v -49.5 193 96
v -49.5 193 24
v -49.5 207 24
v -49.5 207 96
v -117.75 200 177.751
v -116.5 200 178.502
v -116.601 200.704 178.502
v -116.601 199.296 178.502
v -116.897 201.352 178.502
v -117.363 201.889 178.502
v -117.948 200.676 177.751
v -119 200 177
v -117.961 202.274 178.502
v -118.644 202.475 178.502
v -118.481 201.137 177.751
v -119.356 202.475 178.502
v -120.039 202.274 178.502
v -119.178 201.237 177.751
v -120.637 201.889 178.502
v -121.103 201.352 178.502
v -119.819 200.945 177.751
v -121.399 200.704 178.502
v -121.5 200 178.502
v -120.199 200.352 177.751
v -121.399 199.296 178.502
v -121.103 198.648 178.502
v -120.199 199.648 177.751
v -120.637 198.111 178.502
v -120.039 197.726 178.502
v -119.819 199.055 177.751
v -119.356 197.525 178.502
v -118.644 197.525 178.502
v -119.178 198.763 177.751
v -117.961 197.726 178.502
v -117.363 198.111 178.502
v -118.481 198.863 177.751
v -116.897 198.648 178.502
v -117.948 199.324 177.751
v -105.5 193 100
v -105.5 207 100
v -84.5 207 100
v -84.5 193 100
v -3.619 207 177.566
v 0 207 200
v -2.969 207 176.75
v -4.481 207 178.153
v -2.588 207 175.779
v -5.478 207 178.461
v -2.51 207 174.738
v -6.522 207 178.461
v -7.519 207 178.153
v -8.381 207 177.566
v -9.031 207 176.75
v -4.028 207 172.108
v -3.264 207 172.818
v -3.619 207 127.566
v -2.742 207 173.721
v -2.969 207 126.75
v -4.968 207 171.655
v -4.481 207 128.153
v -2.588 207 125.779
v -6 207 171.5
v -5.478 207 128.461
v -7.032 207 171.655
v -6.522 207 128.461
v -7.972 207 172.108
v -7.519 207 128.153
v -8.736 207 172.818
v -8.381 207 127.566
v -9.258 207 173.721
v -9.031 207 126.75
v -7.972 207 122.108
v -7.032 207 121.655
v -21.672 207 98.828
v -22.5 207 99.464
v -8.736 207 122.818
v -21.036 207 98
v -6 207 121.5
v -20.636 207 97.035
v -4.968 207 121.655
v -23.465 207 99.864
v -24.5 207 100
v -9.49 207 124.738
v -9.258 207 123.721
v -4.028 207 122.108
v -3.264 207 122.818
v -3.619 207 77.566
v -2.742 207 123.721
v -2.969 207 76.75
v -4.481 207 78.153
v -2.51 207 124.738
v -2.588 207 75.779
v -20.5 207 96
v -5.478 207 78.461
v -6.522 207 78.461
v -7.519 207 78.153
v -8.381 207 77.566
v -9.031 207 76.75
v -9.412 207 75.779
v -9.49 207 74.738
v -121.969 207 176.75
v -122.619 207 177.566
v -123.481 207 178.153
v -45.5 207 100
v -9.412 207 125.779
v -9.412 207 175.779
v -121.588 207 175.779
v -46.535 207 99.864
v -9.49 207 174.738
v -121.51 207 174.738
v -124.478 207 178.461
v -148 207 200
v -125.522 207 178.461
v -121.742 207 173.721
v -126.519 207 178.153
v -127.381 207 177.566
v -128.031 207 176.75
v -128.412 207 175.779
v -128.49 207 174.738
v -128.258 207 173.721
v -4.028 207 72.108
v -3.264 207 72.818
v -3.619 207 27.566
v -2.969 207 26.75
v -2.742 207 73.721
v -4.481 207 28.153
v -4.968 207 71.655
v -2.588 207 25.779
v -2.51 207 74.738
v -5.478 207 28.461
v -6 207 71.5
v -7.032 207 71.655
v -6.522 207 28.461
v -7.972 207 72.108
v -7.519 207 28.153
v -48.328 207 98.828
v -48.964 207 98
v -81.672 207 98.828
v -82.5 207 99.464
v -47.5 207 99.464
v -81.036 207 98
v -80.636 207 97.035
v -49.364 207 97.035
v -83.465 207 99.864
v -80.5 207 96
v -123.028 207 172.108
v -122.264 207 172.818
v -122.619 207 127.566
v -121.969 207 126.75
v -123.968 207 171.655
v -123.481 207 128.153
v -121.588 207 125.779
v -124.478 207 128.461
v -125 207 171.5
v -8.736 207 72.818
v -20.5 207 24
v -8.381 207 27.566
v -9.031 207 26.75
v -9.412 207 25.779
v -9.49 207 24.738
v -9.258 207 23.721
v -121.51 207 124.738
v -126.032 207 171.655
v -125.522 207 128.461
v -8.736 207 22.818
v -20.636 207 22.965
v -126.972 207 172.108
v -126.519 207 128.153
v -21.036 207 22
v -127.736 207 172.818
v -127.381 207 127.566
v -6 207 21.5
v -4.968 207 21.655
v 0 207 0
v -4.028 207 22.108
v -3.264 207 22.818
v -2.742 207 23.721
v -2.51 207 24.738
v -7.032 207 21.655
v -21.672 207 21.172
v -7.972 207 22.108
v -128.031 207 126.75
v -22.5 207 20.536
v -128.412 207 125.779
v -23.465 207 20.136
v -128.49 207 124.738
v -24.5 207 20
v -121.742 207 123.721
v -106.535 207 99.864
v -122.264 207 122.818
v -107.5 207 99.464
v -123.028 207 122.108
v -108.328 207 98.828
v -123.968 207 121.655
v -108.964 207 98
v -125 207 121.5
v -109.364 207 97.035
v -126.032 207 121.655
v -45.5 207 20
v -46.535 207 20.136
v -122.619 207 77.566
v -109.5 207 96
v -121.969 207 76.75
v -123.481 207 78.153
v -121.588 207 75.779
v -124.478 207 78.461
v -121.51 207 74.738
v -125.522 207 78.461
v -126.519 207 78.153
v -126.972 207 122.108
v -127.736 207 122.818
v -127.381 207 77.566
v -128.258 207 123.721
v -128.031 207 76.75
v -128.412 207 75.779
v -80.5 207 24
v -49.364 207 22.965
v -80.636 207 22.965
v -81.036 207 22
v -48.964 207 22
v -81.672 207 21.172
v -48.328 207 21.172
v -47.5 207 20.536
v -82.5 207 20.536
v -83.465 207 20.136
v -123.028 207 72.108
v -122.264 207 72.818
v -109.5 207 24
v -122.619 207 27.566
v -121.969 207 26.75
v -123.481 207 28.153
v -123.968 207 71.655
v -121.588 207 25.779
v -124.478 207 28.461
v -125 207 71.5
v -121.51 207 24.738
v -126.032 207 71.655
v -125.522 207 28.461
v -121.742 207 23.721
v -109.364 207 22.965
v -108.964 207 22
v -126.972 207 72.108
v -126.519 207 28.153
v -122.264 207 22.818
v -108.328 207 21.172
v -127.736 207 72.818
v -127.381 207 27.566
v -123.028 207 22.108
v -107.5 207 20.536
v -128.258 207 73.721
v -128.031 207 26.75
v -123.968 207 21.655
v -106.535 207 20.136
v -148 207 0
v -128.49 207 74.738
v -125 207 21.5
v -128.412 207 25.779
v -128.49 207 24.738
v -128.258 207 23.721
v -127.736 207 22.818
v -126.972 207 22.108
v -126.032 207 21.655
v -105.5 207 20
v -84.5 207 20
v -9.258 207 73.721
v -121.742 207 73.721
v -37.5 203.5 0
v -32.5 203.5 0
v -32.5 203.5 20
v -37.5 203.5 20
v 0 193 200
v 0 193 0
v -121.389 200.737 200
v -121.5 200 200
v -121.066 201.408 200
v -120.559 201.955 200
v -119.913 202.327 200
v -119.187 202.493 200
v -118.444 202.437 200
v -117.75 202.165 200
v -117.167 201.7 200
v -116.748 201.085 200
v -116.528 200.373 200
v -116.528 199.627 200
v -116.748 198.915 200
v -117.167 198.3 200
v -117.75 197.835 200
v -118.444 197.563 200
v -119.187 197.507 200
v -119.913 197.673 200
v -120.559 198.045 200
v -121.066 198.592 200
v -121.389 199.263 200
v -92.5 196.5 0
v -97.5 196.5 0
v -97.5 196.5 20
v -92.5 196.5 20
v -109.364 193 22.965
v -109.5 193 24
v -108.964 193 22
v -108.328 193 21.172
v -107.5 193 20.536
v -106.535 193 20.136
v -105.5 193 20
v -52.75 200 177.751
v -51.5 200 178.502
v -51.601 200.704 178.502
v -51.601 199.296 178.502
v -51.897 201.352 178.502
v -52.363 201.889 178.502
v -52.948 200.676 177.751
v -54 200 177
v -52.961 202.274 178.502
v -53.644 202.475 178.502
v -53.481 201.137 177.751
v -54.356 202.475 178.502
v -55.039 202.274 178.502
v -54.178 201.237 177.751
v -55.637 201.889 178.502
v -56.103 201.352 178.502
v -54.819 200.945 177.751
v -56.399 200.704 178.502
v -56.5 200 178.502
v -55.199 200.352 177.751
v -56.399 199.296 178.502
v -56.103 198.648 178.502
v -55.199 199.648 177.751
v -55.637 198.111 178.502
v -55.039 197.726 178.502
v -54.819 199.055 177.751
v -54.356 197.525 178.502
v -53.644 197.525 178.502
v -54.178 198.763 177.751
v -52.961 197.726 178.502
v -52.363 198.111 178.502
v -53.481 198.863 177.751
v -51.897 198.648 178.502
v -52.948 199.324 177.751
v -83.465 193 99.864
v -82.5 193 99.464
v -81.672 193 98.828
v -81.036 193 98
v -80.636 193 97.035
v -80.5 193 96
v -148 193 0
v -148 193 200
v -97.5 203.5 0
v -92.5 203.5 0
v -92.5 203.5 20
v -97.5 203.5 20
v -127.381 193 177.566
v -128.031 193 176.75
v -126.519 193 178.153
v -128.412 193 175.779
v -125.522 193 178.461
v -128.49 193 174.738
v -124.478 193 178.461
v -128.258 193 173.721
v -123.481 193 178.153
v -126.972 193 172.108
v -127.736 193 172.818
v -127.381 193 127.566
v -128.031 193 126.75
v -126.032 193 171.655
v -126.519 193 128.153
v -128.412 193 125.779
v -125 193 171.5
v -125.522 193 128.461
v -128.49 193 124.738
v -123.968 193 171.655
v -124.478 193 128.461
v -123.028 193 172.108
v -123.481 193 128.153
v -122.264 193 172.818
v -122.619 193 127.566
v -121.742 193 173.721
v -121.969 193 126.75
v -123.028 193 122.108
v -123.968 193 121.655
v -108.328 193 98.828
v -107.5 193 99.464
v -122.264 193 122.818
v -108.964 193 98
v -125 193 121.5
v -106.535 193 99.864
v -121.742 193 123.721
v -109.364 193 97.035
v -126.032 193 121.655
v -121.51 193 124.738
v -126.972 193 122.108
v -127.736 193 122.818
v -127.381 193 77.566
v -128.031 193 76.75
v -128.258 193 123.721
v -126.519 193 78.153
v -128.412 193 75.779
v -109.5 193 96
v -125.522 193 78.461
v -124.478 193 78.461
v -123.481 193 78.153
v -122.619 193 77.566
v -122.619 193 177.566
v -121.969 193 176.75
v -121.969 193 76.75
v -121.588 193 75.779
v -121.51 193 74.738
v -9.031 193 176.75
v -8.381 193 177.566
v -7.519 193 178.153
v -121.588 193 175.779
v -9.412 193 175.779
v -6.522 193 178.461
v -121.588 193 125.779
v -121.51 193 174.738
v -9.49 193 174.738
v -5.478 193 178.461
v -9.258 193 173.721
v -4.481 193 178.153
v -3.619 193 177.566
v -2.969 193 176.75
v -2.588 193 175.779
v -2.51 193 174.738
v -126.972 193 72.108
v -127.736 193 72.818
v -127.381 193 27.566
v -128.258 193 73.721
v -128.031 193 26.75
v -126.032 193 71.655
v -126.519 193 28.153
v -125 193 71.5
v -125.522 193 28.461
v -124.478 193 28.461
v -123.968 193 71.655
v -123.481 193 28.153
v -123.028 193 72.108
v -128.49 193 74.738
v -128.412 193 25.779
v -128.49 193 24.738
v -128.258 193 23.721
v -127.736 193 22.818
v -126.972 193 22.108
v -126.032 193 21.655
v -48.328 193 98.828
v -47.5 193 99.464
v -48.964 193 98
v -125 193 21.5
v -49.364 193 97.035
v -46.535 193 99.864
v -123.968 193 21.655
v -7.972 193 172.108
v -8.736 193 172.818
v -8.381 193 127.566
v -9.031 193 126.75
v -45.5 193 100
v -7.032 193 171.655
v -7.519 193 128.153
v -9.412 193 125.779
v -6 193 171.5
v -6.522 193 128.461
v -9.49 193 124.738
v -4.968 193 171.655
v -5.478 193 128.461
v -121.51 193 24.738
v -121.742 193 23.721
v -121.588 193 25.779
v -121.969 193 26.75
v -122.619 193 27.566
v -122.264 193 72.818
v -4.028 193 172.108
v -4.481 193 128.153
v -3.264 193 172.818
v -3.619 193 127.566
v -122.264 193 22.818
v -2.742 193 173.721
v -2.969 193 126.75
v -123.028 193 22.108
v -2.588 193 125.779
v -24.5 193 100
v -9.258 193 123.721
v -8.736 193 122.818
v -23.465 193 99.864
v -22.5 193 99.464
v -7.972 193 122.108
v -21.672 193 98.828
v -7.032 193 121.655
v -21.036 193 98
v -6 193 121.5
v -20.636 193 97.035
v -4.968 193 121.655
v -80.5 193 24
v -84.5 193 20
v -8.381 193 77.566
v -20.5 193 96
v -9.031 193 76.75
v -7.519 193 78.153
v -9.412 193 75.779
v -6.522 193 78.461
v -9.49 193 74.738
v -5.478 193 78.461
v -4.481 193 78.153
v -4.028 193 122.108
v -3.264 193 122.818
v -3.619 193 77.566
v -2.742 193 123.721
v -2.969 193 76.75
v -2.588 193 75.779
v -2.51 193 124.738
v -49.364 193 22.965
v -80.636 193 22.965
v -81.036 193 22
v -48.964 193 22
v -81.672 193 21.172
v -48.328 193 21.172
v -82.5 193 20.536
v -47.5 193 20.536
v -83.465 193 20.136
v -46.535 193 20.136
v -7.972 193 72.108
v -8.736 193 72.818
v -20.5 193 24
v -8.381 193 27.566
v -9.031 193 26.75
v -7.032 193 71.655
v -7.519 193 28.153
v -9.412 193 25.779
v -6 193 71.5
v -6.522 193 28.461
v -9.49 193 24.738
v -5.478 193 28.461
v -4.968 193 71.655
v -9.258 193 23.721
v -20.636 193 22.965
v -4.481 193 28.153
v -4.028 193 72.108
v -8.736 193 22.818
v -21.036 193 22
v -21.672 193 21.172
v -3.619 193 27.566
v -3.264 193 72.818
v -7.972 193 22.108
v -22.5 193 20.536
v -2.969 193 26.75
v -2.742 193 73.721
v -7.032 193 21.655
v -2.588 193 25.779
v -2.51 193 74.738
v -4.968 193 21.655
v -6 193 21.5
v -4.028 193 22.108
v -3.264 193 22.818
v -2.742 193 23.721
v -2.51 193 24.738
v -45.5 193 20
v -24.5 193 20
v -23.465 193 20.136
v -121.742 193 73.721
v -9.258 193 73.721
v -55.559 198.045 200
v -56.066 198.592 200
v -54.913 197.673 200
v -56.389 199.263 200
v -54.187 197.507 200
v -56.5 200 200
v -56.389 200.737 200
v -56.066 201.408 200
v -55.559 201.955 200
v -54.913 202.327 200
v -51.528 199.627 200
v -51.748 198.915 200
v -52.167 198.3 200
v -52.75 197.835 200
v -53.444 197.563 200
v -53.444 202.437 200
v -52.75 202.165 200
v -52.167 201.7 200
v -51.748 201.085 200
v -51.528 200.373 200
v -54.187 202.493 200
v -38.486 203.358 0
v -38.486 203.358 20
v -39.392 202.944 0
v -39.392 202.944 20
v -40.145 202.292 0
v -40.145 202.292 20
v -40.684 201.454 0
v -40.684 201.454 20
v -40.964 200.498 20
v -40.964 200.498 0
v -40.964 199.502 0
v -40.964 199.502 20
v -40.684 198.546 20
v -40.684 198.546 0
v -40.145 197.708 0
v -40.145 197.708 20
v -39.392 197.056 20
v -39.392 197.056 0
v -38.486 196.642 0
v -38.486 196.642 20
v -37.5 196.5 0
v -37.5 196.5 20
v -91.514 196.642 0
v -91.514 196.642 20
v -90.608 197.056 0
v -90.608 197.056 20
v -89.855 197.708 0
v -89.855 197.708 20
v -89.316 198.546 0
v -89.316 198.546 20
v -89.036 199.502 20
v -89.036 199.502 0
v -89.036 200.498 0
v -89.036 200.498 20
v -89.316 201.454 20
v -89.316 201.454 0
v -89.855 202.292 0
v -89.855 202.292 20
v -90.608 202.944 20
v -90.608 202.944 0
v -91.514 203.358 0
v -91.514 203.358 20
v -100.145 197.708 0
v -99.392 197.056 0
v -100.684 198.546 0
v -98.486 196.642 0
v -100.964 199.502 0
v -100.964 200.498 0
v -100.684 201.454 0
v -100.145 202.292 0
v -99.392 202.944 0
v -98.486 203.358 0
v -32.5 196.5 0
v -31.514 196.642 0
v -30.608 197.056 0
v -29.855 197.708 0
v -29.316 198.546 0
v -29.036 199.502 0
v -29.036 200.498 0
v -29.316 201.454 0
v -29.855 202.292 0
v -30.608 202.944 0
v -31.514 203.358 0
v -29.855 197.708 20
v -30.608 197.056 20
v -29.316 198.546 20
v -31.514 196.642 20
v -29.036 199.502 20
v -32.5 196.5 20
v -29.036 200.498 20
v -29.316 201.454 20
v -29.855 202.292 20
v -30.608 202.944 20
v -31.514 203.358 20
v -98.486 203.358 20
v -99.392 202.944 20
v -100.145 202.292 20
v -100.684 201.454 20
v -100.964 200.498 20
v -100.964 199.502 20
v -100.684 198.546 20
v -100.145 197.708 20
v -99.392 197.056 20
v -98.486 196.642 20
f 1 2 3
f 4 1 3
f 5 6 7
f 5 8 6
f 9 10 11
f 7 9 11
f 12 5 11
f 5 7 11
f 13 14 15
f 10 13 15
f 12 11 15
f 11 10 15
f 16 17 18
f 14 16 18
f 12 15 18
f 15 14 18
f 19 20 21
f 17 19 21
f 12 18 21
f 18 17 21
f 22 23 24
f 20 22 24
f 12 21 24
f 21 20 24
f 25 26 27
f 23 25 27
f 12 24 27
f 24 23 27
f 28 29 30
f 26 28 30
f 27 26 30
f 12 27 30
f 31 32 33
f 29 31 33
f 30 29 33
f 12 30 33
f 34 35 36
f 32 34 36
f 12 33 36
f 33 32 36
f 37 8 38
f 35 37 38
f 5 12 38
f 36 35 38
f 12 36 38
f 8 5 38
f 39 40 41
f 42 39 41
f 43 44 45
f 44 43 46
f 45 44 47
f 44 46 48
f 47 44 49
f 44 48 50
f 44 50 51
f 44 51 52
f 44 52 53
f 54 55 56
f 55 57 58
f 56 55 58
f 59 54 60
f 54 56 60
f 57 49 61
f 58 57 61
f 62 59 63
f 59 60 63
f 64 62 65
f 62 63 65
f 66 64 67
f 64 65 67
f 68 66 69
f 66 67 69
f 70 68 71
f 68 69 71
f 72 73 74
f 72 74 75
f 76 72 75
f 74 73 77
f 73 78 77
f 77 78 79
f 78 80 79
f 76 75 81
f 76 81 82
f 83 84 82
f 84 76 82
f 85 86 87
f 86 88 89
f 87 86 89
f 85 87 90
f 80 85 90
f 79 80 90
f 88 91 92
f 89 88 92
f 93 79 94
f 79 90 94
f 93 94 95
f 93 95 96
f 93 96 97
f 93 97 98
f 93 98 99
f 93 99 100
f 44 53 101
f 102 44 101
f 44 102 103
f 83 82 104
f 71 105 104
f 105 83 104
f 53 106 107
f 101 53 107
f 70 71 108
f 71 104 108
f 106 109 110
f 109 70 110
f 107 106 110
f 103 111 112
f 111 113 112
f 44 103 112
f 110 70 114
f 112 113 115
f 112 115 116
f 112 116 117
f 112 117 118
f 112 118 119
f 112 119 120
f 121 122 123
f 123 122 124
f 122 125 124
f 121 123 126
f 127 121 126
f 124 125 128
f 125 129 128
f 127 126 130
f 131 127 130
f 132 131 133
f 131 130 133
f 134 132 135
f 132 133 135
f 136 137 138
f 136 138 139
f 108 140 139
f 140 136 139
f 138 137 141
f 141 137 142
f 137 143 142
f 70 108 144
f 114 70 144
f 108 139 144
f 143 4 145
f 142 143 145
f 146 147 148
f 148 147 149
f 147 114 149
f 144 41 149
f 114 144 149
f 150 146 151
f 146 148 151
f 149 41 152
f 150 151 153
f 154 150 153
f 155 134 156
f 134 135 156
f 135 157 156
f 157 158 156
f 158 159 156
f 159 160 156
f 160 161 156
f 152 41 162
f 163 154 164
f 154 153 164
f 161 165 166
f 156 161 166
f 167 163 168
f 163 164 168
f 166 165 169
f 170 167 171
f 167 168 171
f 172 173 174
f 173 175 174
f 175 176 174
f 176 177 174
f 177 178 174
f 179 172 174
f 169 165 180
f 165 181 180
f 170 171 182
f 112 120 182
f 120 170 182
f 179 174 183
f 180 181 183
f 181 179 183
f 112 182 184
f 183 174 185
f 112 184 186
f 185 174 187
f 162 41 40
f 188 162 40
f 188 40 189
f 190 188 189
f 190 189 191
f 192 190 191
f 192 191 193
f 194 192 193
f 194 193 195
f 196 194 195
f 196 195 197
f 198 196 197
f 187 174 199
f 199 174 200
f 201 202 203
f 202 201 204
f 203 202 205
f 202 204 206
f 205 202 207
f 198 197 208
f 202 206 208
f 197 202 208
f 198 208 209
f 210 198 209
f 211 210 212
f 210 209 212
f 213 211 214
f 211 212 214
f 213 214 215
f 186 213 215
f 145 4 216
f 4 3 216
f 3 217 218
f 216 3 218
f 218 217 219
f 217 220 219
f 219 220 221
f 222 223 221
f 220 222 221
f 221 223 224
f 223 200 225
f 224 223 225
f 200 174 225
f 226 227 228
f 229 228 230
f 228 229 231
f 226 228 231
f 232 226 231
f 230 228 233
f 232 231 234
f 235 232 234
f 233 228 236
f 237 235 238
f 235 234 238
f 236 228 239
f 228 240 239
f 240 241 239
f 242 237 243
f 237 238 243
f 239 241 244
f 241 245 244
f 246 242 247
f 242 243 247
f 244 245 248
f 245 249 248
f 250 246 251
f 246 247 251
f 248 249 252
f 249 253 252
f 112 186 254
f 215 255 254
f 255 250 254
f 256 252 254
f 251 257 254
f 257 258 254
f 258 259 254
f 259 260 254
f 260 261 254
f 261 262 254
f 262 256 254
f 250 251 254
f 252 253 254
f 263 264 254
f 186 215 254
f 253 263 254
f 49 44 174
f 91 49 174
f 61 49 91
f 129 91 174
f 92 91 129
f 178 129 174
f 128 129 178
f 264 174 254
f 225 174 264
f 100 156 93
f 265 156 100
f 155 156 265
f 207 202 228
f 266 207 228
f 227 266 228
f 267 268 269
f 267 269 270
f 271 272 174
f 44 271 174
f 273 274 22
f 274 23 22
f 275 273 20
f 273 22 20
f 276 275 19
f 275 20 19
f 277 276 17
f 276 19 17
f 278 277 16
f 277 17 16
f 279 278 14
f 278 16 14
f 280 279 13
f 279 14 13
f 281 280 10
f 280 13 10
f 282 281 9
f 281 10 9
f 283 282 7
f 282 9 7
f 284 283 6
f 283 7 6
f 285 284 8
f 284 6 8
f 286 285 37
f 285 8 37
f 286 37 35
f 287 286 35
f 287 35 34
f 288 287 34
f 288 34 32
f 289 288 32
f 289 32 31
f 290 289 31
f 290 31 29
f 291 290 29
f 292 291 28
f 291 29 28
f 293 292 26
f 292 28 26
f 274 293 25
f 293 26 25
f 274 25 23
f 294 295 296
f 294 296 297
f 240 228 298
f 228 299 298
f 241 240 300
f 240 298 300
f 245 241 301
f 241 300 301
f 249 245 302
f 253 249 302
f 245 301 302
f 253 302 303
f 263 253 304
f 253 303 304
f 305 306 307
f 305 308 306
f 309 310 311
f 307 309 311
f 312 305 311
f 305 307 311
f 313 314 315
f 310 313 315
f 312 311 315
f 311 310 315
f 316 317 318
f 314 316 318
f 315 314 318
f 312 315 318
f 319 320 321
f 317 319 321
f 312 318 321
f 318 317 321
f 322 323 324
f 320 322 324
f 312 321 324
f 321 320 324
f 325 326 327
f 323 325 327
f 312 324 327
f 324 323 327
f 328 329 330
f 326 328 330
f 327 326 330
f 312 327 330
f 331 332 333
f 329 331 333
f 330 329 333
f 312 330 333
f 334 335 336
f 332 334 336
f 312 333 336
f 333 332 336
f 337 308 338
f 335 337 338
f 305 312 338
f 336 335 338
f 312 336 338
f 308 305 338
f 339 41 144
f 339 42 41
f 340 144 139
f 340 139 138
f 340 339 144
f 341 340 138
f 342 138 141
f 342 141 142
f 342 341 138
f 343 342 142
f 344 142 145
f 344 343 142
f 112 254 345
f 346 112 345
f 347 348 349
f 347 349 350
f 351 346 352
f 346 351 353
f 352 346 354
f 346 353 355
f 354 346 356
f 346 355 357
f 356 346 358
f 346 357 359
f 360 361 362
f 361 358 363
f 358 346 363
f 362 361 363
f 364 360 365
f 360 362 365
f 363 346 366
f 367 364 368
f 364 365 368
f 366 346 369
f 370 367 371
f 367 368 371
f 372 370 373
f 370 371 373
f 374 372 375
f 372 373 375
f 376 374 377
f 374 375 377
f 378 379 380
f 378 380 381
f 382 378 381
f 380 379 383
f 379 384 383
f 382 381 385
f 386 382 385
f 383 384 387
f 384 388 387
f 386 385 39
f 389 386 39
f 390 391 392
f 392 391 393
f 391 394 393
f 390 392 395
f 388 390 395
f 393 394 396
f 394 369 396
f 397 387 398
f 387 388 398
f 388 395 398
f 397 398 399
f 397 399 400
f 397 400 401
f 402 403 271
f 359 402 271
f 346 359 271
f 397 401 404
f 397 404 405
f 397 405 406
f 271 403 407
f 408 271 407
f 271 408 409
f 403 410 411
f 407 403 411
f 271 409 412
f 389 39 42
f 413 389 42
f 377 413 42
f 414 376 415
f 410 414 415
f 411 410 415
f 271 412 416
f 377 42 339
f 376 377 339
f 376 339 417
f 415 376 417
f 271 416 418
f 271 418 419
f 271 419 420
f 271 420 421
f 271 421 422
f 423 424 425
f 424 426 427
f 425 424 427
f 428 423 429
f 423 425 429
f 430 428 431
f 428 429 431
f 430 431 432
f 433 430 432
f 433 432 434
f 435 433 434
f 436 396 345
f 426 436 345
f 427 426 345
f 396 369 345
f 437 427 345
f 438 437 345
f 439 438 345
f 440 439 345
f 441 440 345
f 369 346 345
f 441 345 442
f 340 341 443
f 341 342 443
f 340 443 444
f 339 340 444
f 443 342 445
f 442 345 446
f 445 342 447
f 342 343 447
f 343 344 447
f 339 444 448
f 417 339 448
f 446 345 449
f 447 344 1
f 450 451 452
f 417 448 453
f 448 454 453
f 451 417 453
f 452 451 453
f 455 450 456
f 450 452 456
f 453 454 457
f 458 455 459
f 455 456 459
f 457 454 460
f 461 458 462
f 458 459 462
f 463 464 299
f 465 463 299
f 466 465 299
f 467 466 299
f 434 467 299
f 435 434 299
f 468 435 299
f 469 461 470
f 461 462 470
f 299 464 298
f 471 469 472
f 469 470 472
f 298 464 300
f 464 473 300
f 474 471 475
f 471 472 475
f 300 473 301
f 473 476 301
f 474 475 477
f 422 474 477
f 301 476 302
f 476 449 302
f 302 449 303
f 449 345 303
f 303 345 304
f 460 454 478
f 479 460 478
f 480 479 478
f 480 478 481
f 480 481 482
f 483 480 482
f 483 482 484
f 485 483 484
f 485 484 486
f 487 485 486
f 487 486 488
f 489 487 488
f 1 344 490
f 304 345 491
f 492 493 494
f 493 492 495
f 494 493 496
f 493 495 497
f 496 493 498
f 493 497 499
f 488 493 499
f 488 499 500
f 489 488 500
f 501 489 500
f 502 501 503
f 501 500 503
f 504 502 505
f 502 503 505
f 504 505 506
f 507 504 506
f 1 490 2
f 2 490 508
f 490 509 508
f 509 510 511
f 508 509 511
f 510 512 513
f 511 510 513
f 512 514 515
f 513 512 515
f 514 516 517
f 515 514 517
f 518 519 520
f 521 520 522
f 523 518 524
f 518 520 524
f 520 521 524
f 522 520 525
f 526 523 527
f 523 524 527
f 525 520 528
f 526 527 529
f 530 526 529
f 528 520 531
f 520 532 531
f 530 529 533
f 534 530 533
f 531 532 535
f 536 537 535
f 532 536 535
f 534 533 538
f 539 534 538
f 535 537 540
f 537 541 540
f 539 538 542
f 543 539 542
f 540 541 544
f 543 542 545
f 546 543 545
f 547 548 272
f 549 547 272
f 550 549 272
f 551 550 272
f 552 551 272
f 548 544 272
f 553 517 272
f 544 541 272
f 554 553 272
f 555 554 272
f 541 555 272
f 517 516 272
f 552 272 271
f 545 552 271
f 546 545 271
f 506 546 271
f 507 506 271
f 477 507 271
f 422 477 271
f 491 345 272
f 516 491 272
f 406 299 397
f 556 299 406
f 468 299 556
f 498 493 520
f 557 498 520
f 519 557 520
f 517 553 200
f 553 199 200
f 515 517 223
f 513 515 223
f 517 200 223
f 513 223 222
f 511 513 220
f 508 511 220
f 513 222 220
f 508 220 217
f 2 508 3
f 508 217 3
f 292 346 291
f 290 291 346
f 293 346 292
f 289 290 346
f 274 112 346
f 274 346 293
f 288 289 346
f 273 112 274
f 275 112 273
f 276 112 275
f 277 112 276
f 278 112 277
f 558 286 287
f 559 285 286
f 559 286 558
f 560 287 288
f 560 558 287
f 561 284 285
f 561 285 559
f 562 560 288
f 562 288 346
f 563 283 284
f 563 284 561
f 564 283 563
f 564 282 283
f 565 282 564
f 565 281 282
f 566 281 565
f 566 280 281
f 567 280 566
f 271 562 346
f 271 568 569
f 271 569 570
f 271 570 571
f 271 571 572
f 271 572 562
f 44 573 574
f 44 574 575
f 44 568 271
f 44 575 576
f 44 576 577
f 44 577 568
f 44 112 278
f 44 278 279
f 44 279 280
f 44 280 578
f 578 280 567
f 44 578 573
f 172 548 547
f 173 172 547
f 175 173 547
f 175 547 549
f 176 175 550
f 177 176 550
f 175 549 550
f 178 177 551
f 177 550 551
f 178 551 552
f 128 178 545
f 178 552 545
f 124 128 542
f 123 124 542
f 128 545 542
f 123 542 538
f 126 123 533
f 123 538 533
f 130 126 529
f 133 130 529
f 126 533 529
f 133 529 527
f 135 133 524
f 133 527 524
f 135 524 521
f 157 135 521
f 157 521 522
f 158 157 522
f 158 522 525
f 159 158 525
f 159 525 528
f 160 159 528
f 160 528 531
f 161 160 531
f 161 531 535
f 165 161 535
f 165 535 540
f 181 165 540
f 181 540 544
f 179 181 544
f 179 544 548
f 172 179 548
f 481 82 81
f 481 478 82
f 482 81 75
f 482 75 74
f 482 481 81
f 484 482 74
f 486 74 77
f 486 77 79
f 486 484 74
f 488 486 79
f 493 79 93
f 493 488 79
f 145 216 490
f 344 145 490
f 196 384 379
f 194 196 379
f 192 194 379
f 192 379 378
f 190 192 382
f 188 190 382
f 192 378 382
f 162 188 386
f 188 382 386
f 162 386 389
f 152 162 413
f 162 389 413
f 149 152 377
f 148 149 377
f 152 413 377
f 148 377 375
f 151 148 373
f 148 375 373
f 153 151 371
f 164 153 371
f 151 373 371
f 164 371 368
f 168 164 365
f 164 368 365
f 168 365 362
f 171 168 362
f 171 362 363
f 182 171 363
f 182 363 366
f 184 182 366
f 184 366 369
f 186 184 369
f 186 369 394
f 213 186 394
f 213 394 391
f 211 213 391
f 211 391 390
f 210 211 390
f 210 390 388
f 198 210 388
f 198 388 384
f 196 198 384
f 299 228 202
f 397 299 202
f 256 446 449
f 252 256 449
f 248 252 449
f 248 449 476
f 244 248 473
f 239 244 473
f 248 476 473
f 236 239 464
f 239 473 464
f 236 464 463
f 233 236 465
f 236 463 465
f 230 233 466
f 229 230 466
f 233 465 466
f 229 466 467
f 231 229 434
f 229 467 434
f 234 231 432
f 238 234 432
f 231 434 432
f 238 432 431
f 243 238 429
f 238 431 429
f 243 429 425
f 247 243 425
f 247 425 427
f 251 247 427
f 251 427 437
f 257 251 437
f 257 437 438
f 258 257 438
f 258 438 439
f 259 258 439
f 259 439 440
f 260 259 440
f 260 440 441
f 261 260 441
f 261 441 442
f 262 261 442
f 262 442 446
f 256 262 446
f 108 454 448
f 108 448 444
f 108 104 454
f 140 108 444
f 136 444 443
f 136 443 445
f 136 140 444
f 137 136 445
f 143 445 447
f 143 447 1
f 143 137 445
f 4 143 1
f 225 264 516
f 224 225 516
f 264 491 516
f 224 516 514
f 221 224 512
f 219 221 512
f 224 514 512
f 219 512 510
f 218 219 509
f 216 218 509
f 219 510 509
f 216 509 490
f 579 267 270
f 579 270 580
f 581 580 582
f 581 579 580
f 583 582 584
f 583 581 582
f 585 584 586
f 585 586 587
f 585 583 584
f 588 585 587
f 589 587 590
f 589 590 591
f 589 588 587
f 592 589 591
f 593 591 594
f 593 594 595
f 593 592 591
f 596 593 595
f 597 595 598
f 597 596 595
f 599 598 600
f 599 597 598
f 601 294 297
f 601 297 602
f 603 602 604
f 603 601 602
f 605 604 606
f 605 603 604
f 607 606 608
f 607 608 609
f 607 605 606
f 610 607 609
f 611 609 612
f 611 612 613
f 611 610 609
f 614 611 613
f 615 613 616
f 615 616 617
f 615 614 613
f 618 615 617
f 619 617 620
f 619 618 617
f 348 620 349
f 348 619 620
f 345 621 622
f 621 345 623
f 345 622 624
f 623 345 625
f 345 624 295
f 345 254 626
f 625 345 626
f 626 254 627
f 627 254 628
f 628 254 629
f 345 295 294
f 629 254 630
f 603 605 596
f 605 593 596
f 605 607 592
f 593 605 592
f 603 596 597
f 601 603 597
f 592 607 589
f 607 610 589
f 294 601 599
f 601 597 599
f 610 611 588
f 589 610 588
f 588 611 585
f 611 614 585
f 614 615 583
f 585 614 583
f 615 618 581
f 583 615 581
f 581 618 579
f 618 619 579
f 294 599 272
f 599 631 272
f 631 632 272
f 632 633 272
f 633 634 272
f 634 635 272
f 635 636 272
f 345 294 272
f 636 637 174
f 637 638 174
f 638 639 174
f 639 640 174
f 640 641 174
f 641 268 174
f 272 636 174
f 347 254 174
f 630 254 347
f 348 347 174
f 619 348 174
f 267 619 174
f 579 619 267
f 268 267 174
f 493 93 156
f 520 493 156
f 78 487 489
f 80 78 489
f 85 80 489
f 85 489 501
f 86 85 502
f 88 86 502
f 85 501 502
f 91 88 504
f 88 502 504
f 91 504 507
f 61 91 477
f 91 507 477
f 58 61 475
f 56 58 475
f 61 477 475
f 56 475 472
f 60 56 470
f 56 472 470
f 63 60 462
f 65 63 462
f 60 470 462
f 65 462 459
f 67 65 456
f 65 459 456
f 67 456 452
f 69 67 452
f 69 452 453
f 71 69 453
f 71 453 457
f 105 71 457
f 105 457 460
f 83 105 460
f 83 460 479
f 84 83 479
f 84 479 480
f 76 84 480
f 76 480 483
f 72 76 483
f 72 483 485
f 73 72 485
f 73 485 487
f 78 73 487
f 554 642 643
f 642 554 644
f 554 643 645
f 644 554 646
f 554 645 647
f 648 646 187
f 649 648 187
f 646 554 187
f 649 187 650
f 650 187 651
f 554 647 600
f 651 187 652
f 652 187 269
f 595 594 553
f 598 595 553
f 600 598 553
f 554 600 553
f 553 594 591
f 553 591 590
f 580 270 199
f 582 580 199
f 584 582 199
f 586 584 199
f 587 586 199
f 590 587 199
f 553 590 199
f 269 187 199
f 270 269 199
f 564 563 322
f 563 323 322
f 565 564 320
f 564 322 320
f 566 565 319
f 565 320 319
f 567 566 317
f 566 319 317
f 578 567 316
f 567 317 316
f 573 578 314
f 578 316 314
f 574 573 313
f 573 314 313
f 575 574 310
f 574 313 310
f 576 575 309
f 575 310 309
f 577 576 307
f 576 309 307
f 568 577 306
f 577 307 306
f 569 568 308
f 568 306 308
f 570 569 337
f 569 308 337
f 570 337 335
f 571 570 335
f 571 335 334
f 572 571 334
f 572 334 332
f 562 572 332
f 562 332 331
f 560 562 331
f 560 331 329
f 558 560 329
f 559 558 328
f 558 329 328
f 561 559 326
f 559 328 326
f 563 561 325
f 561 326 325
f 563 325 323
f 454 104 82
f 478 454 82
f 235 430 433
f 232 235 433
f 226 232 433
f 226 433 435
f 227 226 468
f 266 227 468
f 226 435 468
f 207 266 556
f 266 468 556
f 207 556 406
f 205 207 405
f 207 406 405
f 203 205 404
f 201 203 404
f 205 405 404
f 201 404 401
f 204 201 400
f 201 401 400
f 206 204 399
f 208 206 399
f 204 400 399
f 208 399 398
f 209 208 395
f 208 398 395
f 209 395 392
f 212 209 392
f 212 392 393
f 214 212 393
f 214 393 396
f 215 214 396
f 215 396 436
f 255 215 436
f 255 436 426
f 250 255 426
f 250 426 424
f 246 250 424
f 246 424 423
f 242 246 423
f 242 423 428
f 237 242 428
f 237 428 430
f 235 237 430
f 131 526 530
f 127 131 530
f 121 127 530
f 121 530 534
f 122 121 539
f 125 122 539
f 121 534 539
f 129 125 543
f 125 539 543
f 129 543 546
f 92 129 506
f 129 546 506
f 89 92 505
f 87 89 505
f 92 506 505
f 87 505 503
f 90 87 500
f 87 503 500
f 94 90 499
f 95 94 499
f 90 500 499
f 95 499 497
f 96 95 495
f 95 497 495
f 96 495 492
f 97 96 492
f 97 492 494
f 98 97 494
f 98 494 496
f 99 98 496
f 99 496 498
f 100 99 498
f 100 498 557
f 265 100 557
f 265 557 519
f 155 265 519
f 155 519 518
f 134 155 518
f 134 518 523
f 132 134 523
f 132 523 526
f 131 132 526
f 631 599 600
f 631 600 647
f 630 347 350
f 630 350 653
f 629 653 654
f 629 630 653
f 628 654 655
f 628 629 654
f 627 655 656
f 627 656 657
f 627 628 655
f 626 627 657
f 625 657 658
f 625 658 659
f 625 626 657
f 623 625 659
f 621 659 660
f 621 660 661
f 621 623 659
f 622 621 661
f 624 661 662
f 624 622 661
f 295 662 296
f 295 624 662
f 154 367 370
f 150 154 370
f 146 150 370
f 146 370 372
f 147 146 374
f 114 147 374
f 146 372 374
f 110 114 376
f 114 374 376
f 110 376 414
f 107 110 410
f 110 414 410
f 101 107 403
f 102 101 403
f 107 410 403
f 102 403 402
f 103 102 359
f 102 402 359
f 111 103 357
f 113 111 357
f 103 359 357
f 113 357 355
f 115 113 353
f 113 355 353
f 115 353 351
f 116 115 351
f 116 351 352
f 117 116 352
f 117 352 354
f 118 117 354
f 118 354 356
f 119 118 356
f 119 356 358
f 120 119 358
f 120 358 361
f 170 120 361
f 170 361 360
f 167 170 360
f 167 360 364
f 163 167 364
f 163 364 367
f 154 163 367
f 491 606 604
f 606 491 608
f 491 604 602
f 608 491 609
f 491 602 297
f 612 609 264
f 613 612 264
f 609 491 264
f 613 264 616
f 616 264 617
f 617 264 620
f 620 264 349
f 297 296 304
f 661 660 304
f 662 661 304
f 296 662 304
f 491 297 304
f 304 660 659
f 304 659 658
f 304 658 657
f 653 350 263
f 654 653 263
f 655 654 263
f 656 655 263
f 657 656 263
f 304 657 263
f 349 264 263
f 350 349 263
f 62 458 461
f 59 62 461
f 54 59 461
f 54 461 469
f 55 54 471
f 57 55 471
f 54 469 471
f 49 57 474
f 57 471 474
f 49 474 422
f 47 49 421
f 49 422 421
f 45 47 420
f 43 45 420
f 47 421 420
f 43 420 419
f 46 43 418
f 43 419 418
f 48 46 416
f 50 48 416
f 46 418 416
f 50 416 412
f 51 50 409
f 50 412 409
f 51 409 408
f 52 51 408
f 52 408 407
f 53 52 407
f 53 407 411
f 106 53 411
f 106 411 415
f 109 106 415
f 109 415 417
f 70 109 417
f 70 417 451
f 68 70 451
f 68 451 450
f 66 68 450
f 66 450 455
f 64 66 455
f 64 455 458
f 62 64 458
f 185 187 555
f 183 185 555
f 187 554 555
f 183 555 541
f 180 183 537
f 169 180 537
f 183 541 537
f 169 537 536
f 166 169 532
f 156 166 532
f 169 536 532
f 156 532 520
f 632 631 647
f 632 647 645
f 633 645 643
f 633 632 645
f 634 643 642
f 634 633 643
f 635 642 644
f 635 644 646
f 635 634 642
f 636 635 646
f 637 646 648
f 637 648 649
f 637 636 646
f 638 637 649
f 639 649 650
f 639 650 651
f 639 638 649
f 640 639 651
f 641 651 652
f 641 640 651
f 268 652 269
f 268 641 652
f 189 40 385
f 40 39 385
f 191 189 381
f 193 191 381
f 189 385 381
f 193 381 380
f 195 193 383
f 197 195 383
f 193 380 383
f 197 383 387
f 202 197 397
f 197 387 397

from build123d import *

# Parameters (mm, degrees)
BOSS_EXTRUDE1_DEPTH       = 200
CUT_EXTRUDE1_DEPTH        = 250.198715888
F_6_0MM_DOWEL_SLOT1_DEPTH = 20
M6X1_0_TAPPED_HOLE1_D     = 5
M6X1_0_TAPPED_HOLE1_DEPTH = 21.497848452
M6X1_0_TAPPED_HOLE1_TIP   = 1.502151548
FILLET1_R                 = 4
BOSS_EXTRUDE2_DEPTH       = 80
FILLET2_R                 = 4
SKETCH13_R                = 3.5
CUT_EXTRUDE2_DEPTH        = 250.198715888


# Read off the part's stored shape, not the designer's step: Ø6.0mm Dowel Slot1
with BuildPart() as part:
    # Sketch1 → Boss-Extrude1 (new body)
    with BuildSketch(Plane.XY):
        Polygon((-21, 207), (-148, 207), (-148, 197.5), (-148, 193), (-24, 193), (-12, 193), (0, 193), (0, 207), (-12, 207), align=None)
    extrude(amount=BOSS_EXTRUDE1_DEPTH)

    # Sketch3 → Cut-Extrude1 (cut, through all)
    with BuildSketch(Plane(origin=(0, 207, 0), x_dir=(1, 0, 0), z_dir=(0, 1, 0))):
        Polygon((-20.5, -100), (-20.5, -20), (-22.5, -20), (-27.5, -20), (-39.5, -20), (-42, -20), (-107.5, -20), (-109.5, -20), (-109.5, -100), (-107.5, -100), (-42, -100), (-39.5, -100), (-27.5, -100), (-22.5, -100), align=None)
    extrude(amount=-CUT_EXTRUDE1_DEPTH, mode=Mode.SUBTRACT)

    # Ø6.0mm Dowel Slot1 outline → Ø6.0mm Dowel Slot1 (cut)
    with BuildSketch(Plane.XY):
        with BuildLine():
            Line((-37.5, 196.5), (-32.5, 196.5))
            ThreePointArc((-32.5, 196.5), (-29, 200), (-32.5, 203.5))
            Line((-32.5, 203.5), (-37.5, 203.5))
            ThreePointArc((-37.5, 203.5), (-41, 200), (-37.5, 196.5))
        make_face()
        with BuildLine():
            ThreePointArc((-92.5, 196.5), (-89, 200), (-92.5, 203.5))
            Line((-92.5, 203.5), (-97.5, 203.5))
            ThreePointArc((-97.5, 203.5), (-101, 200), (-97.5, 196.5))
            Line((-97.5, 196.5), (-92.5, 196.5))
        make_face()
    extrude(amount=F_6_0MM_DOWEL_SLOT1_DEPTH, mode=Mode.SUBTRACT)

    # M6x1.0 Tapped Hole1
    with Locations(Plane.XY.offset(200)):
        with Locations((-119, 200), (-54, 200)):
            Hole(M6X1_0_TAPPED_HOLE1_D / 2, depth=M6X1_0_TAPPED_HOLE1_DEPTH)
            with Locations((0, 0, -(M6X1_0_TAPPED_HOLE1_DEPTH + M6X1_0_TAPPED_HOLE1_TIP / 2))):  # 118° drill point
                Cone(0, M6X1_0_TAPPED_HOLE1_D / 2, M6X1_0_TAPPED_HOLE1_TIP, mode=Mode.SUBTRACT)

    # Fillet1
    fillet1_edges = [part.edges().sort_by_distance(p)[0] for p in [
        (-20.5, 200, 100),
        (-109.5, 200, 100),
        (-109.5, 200, 20),
        (-20.5, 200, 20),
    ]]
    fillet(fillet1_edges, radius=FILLET1_R)

    # Sketch15 → Boss-Extrude2 (add)
    with BuildSketch(Plane.XY.offset(20)):
        Polygon((-80.5, 200), (-80.5, 193), (-49.5, 193), (-49.5, 200), (-49.5, 207), (-80.5, 207), align=None)
    extrude(amount=BOSS_EXTRUDE2_DEPTH)

    # Fillet2
    fillet2_edges = [part.edges().sort_by_distance(p)[0] for p in [
        (-80.5, 200, 20),
        (-49.5, 200, 20),
        (-80.5, 200, 100),
        (-49.5, 200, 100),
    ]]
    fillet(fillet2_edges, radius=FILLET2_R)

    # Sketch13 → Cut-Extrude2 (cut, through all)
    with BuildSketch(Plane.XZ.offset(-193)):
        with Locations(Location((-6, 75, 0), (0, 0, 270))):
            Circle(SKETCH13_R)
        with Locations(Location((-6, 125, 0), (0, 0, 270))):
            Circle(SKETCH13_R)
        with Locations(Location((-6, 175, 0), (0, 0, 270))):
            Circle(SKETCH13_R)
        with Locations(Location((-125, 125, 0), (0, 0, 270))):
            Circle(SKETCH13_R)
        with Locations(Location((-125, 75, 0), (0, 0, 270))):
            Circle(SKETCH13_R)
        with Locations(Location((-6, 25, 0), (0, 0, 270))):
            Circle(SKETCH13_R)
        with Locations(Location((-125, 175, 0), (0, 0, 270))):
            Circle(SKETCH13_R)
        with Locations(Location((-125, 25, 0), (0, 0, 270))):
            Circle(SKETCH13_R)
    extrude(amount=-CUT_EXTRUDE2_DEPTH, mode=Mode.SUBTRACT)


solid = part.part
